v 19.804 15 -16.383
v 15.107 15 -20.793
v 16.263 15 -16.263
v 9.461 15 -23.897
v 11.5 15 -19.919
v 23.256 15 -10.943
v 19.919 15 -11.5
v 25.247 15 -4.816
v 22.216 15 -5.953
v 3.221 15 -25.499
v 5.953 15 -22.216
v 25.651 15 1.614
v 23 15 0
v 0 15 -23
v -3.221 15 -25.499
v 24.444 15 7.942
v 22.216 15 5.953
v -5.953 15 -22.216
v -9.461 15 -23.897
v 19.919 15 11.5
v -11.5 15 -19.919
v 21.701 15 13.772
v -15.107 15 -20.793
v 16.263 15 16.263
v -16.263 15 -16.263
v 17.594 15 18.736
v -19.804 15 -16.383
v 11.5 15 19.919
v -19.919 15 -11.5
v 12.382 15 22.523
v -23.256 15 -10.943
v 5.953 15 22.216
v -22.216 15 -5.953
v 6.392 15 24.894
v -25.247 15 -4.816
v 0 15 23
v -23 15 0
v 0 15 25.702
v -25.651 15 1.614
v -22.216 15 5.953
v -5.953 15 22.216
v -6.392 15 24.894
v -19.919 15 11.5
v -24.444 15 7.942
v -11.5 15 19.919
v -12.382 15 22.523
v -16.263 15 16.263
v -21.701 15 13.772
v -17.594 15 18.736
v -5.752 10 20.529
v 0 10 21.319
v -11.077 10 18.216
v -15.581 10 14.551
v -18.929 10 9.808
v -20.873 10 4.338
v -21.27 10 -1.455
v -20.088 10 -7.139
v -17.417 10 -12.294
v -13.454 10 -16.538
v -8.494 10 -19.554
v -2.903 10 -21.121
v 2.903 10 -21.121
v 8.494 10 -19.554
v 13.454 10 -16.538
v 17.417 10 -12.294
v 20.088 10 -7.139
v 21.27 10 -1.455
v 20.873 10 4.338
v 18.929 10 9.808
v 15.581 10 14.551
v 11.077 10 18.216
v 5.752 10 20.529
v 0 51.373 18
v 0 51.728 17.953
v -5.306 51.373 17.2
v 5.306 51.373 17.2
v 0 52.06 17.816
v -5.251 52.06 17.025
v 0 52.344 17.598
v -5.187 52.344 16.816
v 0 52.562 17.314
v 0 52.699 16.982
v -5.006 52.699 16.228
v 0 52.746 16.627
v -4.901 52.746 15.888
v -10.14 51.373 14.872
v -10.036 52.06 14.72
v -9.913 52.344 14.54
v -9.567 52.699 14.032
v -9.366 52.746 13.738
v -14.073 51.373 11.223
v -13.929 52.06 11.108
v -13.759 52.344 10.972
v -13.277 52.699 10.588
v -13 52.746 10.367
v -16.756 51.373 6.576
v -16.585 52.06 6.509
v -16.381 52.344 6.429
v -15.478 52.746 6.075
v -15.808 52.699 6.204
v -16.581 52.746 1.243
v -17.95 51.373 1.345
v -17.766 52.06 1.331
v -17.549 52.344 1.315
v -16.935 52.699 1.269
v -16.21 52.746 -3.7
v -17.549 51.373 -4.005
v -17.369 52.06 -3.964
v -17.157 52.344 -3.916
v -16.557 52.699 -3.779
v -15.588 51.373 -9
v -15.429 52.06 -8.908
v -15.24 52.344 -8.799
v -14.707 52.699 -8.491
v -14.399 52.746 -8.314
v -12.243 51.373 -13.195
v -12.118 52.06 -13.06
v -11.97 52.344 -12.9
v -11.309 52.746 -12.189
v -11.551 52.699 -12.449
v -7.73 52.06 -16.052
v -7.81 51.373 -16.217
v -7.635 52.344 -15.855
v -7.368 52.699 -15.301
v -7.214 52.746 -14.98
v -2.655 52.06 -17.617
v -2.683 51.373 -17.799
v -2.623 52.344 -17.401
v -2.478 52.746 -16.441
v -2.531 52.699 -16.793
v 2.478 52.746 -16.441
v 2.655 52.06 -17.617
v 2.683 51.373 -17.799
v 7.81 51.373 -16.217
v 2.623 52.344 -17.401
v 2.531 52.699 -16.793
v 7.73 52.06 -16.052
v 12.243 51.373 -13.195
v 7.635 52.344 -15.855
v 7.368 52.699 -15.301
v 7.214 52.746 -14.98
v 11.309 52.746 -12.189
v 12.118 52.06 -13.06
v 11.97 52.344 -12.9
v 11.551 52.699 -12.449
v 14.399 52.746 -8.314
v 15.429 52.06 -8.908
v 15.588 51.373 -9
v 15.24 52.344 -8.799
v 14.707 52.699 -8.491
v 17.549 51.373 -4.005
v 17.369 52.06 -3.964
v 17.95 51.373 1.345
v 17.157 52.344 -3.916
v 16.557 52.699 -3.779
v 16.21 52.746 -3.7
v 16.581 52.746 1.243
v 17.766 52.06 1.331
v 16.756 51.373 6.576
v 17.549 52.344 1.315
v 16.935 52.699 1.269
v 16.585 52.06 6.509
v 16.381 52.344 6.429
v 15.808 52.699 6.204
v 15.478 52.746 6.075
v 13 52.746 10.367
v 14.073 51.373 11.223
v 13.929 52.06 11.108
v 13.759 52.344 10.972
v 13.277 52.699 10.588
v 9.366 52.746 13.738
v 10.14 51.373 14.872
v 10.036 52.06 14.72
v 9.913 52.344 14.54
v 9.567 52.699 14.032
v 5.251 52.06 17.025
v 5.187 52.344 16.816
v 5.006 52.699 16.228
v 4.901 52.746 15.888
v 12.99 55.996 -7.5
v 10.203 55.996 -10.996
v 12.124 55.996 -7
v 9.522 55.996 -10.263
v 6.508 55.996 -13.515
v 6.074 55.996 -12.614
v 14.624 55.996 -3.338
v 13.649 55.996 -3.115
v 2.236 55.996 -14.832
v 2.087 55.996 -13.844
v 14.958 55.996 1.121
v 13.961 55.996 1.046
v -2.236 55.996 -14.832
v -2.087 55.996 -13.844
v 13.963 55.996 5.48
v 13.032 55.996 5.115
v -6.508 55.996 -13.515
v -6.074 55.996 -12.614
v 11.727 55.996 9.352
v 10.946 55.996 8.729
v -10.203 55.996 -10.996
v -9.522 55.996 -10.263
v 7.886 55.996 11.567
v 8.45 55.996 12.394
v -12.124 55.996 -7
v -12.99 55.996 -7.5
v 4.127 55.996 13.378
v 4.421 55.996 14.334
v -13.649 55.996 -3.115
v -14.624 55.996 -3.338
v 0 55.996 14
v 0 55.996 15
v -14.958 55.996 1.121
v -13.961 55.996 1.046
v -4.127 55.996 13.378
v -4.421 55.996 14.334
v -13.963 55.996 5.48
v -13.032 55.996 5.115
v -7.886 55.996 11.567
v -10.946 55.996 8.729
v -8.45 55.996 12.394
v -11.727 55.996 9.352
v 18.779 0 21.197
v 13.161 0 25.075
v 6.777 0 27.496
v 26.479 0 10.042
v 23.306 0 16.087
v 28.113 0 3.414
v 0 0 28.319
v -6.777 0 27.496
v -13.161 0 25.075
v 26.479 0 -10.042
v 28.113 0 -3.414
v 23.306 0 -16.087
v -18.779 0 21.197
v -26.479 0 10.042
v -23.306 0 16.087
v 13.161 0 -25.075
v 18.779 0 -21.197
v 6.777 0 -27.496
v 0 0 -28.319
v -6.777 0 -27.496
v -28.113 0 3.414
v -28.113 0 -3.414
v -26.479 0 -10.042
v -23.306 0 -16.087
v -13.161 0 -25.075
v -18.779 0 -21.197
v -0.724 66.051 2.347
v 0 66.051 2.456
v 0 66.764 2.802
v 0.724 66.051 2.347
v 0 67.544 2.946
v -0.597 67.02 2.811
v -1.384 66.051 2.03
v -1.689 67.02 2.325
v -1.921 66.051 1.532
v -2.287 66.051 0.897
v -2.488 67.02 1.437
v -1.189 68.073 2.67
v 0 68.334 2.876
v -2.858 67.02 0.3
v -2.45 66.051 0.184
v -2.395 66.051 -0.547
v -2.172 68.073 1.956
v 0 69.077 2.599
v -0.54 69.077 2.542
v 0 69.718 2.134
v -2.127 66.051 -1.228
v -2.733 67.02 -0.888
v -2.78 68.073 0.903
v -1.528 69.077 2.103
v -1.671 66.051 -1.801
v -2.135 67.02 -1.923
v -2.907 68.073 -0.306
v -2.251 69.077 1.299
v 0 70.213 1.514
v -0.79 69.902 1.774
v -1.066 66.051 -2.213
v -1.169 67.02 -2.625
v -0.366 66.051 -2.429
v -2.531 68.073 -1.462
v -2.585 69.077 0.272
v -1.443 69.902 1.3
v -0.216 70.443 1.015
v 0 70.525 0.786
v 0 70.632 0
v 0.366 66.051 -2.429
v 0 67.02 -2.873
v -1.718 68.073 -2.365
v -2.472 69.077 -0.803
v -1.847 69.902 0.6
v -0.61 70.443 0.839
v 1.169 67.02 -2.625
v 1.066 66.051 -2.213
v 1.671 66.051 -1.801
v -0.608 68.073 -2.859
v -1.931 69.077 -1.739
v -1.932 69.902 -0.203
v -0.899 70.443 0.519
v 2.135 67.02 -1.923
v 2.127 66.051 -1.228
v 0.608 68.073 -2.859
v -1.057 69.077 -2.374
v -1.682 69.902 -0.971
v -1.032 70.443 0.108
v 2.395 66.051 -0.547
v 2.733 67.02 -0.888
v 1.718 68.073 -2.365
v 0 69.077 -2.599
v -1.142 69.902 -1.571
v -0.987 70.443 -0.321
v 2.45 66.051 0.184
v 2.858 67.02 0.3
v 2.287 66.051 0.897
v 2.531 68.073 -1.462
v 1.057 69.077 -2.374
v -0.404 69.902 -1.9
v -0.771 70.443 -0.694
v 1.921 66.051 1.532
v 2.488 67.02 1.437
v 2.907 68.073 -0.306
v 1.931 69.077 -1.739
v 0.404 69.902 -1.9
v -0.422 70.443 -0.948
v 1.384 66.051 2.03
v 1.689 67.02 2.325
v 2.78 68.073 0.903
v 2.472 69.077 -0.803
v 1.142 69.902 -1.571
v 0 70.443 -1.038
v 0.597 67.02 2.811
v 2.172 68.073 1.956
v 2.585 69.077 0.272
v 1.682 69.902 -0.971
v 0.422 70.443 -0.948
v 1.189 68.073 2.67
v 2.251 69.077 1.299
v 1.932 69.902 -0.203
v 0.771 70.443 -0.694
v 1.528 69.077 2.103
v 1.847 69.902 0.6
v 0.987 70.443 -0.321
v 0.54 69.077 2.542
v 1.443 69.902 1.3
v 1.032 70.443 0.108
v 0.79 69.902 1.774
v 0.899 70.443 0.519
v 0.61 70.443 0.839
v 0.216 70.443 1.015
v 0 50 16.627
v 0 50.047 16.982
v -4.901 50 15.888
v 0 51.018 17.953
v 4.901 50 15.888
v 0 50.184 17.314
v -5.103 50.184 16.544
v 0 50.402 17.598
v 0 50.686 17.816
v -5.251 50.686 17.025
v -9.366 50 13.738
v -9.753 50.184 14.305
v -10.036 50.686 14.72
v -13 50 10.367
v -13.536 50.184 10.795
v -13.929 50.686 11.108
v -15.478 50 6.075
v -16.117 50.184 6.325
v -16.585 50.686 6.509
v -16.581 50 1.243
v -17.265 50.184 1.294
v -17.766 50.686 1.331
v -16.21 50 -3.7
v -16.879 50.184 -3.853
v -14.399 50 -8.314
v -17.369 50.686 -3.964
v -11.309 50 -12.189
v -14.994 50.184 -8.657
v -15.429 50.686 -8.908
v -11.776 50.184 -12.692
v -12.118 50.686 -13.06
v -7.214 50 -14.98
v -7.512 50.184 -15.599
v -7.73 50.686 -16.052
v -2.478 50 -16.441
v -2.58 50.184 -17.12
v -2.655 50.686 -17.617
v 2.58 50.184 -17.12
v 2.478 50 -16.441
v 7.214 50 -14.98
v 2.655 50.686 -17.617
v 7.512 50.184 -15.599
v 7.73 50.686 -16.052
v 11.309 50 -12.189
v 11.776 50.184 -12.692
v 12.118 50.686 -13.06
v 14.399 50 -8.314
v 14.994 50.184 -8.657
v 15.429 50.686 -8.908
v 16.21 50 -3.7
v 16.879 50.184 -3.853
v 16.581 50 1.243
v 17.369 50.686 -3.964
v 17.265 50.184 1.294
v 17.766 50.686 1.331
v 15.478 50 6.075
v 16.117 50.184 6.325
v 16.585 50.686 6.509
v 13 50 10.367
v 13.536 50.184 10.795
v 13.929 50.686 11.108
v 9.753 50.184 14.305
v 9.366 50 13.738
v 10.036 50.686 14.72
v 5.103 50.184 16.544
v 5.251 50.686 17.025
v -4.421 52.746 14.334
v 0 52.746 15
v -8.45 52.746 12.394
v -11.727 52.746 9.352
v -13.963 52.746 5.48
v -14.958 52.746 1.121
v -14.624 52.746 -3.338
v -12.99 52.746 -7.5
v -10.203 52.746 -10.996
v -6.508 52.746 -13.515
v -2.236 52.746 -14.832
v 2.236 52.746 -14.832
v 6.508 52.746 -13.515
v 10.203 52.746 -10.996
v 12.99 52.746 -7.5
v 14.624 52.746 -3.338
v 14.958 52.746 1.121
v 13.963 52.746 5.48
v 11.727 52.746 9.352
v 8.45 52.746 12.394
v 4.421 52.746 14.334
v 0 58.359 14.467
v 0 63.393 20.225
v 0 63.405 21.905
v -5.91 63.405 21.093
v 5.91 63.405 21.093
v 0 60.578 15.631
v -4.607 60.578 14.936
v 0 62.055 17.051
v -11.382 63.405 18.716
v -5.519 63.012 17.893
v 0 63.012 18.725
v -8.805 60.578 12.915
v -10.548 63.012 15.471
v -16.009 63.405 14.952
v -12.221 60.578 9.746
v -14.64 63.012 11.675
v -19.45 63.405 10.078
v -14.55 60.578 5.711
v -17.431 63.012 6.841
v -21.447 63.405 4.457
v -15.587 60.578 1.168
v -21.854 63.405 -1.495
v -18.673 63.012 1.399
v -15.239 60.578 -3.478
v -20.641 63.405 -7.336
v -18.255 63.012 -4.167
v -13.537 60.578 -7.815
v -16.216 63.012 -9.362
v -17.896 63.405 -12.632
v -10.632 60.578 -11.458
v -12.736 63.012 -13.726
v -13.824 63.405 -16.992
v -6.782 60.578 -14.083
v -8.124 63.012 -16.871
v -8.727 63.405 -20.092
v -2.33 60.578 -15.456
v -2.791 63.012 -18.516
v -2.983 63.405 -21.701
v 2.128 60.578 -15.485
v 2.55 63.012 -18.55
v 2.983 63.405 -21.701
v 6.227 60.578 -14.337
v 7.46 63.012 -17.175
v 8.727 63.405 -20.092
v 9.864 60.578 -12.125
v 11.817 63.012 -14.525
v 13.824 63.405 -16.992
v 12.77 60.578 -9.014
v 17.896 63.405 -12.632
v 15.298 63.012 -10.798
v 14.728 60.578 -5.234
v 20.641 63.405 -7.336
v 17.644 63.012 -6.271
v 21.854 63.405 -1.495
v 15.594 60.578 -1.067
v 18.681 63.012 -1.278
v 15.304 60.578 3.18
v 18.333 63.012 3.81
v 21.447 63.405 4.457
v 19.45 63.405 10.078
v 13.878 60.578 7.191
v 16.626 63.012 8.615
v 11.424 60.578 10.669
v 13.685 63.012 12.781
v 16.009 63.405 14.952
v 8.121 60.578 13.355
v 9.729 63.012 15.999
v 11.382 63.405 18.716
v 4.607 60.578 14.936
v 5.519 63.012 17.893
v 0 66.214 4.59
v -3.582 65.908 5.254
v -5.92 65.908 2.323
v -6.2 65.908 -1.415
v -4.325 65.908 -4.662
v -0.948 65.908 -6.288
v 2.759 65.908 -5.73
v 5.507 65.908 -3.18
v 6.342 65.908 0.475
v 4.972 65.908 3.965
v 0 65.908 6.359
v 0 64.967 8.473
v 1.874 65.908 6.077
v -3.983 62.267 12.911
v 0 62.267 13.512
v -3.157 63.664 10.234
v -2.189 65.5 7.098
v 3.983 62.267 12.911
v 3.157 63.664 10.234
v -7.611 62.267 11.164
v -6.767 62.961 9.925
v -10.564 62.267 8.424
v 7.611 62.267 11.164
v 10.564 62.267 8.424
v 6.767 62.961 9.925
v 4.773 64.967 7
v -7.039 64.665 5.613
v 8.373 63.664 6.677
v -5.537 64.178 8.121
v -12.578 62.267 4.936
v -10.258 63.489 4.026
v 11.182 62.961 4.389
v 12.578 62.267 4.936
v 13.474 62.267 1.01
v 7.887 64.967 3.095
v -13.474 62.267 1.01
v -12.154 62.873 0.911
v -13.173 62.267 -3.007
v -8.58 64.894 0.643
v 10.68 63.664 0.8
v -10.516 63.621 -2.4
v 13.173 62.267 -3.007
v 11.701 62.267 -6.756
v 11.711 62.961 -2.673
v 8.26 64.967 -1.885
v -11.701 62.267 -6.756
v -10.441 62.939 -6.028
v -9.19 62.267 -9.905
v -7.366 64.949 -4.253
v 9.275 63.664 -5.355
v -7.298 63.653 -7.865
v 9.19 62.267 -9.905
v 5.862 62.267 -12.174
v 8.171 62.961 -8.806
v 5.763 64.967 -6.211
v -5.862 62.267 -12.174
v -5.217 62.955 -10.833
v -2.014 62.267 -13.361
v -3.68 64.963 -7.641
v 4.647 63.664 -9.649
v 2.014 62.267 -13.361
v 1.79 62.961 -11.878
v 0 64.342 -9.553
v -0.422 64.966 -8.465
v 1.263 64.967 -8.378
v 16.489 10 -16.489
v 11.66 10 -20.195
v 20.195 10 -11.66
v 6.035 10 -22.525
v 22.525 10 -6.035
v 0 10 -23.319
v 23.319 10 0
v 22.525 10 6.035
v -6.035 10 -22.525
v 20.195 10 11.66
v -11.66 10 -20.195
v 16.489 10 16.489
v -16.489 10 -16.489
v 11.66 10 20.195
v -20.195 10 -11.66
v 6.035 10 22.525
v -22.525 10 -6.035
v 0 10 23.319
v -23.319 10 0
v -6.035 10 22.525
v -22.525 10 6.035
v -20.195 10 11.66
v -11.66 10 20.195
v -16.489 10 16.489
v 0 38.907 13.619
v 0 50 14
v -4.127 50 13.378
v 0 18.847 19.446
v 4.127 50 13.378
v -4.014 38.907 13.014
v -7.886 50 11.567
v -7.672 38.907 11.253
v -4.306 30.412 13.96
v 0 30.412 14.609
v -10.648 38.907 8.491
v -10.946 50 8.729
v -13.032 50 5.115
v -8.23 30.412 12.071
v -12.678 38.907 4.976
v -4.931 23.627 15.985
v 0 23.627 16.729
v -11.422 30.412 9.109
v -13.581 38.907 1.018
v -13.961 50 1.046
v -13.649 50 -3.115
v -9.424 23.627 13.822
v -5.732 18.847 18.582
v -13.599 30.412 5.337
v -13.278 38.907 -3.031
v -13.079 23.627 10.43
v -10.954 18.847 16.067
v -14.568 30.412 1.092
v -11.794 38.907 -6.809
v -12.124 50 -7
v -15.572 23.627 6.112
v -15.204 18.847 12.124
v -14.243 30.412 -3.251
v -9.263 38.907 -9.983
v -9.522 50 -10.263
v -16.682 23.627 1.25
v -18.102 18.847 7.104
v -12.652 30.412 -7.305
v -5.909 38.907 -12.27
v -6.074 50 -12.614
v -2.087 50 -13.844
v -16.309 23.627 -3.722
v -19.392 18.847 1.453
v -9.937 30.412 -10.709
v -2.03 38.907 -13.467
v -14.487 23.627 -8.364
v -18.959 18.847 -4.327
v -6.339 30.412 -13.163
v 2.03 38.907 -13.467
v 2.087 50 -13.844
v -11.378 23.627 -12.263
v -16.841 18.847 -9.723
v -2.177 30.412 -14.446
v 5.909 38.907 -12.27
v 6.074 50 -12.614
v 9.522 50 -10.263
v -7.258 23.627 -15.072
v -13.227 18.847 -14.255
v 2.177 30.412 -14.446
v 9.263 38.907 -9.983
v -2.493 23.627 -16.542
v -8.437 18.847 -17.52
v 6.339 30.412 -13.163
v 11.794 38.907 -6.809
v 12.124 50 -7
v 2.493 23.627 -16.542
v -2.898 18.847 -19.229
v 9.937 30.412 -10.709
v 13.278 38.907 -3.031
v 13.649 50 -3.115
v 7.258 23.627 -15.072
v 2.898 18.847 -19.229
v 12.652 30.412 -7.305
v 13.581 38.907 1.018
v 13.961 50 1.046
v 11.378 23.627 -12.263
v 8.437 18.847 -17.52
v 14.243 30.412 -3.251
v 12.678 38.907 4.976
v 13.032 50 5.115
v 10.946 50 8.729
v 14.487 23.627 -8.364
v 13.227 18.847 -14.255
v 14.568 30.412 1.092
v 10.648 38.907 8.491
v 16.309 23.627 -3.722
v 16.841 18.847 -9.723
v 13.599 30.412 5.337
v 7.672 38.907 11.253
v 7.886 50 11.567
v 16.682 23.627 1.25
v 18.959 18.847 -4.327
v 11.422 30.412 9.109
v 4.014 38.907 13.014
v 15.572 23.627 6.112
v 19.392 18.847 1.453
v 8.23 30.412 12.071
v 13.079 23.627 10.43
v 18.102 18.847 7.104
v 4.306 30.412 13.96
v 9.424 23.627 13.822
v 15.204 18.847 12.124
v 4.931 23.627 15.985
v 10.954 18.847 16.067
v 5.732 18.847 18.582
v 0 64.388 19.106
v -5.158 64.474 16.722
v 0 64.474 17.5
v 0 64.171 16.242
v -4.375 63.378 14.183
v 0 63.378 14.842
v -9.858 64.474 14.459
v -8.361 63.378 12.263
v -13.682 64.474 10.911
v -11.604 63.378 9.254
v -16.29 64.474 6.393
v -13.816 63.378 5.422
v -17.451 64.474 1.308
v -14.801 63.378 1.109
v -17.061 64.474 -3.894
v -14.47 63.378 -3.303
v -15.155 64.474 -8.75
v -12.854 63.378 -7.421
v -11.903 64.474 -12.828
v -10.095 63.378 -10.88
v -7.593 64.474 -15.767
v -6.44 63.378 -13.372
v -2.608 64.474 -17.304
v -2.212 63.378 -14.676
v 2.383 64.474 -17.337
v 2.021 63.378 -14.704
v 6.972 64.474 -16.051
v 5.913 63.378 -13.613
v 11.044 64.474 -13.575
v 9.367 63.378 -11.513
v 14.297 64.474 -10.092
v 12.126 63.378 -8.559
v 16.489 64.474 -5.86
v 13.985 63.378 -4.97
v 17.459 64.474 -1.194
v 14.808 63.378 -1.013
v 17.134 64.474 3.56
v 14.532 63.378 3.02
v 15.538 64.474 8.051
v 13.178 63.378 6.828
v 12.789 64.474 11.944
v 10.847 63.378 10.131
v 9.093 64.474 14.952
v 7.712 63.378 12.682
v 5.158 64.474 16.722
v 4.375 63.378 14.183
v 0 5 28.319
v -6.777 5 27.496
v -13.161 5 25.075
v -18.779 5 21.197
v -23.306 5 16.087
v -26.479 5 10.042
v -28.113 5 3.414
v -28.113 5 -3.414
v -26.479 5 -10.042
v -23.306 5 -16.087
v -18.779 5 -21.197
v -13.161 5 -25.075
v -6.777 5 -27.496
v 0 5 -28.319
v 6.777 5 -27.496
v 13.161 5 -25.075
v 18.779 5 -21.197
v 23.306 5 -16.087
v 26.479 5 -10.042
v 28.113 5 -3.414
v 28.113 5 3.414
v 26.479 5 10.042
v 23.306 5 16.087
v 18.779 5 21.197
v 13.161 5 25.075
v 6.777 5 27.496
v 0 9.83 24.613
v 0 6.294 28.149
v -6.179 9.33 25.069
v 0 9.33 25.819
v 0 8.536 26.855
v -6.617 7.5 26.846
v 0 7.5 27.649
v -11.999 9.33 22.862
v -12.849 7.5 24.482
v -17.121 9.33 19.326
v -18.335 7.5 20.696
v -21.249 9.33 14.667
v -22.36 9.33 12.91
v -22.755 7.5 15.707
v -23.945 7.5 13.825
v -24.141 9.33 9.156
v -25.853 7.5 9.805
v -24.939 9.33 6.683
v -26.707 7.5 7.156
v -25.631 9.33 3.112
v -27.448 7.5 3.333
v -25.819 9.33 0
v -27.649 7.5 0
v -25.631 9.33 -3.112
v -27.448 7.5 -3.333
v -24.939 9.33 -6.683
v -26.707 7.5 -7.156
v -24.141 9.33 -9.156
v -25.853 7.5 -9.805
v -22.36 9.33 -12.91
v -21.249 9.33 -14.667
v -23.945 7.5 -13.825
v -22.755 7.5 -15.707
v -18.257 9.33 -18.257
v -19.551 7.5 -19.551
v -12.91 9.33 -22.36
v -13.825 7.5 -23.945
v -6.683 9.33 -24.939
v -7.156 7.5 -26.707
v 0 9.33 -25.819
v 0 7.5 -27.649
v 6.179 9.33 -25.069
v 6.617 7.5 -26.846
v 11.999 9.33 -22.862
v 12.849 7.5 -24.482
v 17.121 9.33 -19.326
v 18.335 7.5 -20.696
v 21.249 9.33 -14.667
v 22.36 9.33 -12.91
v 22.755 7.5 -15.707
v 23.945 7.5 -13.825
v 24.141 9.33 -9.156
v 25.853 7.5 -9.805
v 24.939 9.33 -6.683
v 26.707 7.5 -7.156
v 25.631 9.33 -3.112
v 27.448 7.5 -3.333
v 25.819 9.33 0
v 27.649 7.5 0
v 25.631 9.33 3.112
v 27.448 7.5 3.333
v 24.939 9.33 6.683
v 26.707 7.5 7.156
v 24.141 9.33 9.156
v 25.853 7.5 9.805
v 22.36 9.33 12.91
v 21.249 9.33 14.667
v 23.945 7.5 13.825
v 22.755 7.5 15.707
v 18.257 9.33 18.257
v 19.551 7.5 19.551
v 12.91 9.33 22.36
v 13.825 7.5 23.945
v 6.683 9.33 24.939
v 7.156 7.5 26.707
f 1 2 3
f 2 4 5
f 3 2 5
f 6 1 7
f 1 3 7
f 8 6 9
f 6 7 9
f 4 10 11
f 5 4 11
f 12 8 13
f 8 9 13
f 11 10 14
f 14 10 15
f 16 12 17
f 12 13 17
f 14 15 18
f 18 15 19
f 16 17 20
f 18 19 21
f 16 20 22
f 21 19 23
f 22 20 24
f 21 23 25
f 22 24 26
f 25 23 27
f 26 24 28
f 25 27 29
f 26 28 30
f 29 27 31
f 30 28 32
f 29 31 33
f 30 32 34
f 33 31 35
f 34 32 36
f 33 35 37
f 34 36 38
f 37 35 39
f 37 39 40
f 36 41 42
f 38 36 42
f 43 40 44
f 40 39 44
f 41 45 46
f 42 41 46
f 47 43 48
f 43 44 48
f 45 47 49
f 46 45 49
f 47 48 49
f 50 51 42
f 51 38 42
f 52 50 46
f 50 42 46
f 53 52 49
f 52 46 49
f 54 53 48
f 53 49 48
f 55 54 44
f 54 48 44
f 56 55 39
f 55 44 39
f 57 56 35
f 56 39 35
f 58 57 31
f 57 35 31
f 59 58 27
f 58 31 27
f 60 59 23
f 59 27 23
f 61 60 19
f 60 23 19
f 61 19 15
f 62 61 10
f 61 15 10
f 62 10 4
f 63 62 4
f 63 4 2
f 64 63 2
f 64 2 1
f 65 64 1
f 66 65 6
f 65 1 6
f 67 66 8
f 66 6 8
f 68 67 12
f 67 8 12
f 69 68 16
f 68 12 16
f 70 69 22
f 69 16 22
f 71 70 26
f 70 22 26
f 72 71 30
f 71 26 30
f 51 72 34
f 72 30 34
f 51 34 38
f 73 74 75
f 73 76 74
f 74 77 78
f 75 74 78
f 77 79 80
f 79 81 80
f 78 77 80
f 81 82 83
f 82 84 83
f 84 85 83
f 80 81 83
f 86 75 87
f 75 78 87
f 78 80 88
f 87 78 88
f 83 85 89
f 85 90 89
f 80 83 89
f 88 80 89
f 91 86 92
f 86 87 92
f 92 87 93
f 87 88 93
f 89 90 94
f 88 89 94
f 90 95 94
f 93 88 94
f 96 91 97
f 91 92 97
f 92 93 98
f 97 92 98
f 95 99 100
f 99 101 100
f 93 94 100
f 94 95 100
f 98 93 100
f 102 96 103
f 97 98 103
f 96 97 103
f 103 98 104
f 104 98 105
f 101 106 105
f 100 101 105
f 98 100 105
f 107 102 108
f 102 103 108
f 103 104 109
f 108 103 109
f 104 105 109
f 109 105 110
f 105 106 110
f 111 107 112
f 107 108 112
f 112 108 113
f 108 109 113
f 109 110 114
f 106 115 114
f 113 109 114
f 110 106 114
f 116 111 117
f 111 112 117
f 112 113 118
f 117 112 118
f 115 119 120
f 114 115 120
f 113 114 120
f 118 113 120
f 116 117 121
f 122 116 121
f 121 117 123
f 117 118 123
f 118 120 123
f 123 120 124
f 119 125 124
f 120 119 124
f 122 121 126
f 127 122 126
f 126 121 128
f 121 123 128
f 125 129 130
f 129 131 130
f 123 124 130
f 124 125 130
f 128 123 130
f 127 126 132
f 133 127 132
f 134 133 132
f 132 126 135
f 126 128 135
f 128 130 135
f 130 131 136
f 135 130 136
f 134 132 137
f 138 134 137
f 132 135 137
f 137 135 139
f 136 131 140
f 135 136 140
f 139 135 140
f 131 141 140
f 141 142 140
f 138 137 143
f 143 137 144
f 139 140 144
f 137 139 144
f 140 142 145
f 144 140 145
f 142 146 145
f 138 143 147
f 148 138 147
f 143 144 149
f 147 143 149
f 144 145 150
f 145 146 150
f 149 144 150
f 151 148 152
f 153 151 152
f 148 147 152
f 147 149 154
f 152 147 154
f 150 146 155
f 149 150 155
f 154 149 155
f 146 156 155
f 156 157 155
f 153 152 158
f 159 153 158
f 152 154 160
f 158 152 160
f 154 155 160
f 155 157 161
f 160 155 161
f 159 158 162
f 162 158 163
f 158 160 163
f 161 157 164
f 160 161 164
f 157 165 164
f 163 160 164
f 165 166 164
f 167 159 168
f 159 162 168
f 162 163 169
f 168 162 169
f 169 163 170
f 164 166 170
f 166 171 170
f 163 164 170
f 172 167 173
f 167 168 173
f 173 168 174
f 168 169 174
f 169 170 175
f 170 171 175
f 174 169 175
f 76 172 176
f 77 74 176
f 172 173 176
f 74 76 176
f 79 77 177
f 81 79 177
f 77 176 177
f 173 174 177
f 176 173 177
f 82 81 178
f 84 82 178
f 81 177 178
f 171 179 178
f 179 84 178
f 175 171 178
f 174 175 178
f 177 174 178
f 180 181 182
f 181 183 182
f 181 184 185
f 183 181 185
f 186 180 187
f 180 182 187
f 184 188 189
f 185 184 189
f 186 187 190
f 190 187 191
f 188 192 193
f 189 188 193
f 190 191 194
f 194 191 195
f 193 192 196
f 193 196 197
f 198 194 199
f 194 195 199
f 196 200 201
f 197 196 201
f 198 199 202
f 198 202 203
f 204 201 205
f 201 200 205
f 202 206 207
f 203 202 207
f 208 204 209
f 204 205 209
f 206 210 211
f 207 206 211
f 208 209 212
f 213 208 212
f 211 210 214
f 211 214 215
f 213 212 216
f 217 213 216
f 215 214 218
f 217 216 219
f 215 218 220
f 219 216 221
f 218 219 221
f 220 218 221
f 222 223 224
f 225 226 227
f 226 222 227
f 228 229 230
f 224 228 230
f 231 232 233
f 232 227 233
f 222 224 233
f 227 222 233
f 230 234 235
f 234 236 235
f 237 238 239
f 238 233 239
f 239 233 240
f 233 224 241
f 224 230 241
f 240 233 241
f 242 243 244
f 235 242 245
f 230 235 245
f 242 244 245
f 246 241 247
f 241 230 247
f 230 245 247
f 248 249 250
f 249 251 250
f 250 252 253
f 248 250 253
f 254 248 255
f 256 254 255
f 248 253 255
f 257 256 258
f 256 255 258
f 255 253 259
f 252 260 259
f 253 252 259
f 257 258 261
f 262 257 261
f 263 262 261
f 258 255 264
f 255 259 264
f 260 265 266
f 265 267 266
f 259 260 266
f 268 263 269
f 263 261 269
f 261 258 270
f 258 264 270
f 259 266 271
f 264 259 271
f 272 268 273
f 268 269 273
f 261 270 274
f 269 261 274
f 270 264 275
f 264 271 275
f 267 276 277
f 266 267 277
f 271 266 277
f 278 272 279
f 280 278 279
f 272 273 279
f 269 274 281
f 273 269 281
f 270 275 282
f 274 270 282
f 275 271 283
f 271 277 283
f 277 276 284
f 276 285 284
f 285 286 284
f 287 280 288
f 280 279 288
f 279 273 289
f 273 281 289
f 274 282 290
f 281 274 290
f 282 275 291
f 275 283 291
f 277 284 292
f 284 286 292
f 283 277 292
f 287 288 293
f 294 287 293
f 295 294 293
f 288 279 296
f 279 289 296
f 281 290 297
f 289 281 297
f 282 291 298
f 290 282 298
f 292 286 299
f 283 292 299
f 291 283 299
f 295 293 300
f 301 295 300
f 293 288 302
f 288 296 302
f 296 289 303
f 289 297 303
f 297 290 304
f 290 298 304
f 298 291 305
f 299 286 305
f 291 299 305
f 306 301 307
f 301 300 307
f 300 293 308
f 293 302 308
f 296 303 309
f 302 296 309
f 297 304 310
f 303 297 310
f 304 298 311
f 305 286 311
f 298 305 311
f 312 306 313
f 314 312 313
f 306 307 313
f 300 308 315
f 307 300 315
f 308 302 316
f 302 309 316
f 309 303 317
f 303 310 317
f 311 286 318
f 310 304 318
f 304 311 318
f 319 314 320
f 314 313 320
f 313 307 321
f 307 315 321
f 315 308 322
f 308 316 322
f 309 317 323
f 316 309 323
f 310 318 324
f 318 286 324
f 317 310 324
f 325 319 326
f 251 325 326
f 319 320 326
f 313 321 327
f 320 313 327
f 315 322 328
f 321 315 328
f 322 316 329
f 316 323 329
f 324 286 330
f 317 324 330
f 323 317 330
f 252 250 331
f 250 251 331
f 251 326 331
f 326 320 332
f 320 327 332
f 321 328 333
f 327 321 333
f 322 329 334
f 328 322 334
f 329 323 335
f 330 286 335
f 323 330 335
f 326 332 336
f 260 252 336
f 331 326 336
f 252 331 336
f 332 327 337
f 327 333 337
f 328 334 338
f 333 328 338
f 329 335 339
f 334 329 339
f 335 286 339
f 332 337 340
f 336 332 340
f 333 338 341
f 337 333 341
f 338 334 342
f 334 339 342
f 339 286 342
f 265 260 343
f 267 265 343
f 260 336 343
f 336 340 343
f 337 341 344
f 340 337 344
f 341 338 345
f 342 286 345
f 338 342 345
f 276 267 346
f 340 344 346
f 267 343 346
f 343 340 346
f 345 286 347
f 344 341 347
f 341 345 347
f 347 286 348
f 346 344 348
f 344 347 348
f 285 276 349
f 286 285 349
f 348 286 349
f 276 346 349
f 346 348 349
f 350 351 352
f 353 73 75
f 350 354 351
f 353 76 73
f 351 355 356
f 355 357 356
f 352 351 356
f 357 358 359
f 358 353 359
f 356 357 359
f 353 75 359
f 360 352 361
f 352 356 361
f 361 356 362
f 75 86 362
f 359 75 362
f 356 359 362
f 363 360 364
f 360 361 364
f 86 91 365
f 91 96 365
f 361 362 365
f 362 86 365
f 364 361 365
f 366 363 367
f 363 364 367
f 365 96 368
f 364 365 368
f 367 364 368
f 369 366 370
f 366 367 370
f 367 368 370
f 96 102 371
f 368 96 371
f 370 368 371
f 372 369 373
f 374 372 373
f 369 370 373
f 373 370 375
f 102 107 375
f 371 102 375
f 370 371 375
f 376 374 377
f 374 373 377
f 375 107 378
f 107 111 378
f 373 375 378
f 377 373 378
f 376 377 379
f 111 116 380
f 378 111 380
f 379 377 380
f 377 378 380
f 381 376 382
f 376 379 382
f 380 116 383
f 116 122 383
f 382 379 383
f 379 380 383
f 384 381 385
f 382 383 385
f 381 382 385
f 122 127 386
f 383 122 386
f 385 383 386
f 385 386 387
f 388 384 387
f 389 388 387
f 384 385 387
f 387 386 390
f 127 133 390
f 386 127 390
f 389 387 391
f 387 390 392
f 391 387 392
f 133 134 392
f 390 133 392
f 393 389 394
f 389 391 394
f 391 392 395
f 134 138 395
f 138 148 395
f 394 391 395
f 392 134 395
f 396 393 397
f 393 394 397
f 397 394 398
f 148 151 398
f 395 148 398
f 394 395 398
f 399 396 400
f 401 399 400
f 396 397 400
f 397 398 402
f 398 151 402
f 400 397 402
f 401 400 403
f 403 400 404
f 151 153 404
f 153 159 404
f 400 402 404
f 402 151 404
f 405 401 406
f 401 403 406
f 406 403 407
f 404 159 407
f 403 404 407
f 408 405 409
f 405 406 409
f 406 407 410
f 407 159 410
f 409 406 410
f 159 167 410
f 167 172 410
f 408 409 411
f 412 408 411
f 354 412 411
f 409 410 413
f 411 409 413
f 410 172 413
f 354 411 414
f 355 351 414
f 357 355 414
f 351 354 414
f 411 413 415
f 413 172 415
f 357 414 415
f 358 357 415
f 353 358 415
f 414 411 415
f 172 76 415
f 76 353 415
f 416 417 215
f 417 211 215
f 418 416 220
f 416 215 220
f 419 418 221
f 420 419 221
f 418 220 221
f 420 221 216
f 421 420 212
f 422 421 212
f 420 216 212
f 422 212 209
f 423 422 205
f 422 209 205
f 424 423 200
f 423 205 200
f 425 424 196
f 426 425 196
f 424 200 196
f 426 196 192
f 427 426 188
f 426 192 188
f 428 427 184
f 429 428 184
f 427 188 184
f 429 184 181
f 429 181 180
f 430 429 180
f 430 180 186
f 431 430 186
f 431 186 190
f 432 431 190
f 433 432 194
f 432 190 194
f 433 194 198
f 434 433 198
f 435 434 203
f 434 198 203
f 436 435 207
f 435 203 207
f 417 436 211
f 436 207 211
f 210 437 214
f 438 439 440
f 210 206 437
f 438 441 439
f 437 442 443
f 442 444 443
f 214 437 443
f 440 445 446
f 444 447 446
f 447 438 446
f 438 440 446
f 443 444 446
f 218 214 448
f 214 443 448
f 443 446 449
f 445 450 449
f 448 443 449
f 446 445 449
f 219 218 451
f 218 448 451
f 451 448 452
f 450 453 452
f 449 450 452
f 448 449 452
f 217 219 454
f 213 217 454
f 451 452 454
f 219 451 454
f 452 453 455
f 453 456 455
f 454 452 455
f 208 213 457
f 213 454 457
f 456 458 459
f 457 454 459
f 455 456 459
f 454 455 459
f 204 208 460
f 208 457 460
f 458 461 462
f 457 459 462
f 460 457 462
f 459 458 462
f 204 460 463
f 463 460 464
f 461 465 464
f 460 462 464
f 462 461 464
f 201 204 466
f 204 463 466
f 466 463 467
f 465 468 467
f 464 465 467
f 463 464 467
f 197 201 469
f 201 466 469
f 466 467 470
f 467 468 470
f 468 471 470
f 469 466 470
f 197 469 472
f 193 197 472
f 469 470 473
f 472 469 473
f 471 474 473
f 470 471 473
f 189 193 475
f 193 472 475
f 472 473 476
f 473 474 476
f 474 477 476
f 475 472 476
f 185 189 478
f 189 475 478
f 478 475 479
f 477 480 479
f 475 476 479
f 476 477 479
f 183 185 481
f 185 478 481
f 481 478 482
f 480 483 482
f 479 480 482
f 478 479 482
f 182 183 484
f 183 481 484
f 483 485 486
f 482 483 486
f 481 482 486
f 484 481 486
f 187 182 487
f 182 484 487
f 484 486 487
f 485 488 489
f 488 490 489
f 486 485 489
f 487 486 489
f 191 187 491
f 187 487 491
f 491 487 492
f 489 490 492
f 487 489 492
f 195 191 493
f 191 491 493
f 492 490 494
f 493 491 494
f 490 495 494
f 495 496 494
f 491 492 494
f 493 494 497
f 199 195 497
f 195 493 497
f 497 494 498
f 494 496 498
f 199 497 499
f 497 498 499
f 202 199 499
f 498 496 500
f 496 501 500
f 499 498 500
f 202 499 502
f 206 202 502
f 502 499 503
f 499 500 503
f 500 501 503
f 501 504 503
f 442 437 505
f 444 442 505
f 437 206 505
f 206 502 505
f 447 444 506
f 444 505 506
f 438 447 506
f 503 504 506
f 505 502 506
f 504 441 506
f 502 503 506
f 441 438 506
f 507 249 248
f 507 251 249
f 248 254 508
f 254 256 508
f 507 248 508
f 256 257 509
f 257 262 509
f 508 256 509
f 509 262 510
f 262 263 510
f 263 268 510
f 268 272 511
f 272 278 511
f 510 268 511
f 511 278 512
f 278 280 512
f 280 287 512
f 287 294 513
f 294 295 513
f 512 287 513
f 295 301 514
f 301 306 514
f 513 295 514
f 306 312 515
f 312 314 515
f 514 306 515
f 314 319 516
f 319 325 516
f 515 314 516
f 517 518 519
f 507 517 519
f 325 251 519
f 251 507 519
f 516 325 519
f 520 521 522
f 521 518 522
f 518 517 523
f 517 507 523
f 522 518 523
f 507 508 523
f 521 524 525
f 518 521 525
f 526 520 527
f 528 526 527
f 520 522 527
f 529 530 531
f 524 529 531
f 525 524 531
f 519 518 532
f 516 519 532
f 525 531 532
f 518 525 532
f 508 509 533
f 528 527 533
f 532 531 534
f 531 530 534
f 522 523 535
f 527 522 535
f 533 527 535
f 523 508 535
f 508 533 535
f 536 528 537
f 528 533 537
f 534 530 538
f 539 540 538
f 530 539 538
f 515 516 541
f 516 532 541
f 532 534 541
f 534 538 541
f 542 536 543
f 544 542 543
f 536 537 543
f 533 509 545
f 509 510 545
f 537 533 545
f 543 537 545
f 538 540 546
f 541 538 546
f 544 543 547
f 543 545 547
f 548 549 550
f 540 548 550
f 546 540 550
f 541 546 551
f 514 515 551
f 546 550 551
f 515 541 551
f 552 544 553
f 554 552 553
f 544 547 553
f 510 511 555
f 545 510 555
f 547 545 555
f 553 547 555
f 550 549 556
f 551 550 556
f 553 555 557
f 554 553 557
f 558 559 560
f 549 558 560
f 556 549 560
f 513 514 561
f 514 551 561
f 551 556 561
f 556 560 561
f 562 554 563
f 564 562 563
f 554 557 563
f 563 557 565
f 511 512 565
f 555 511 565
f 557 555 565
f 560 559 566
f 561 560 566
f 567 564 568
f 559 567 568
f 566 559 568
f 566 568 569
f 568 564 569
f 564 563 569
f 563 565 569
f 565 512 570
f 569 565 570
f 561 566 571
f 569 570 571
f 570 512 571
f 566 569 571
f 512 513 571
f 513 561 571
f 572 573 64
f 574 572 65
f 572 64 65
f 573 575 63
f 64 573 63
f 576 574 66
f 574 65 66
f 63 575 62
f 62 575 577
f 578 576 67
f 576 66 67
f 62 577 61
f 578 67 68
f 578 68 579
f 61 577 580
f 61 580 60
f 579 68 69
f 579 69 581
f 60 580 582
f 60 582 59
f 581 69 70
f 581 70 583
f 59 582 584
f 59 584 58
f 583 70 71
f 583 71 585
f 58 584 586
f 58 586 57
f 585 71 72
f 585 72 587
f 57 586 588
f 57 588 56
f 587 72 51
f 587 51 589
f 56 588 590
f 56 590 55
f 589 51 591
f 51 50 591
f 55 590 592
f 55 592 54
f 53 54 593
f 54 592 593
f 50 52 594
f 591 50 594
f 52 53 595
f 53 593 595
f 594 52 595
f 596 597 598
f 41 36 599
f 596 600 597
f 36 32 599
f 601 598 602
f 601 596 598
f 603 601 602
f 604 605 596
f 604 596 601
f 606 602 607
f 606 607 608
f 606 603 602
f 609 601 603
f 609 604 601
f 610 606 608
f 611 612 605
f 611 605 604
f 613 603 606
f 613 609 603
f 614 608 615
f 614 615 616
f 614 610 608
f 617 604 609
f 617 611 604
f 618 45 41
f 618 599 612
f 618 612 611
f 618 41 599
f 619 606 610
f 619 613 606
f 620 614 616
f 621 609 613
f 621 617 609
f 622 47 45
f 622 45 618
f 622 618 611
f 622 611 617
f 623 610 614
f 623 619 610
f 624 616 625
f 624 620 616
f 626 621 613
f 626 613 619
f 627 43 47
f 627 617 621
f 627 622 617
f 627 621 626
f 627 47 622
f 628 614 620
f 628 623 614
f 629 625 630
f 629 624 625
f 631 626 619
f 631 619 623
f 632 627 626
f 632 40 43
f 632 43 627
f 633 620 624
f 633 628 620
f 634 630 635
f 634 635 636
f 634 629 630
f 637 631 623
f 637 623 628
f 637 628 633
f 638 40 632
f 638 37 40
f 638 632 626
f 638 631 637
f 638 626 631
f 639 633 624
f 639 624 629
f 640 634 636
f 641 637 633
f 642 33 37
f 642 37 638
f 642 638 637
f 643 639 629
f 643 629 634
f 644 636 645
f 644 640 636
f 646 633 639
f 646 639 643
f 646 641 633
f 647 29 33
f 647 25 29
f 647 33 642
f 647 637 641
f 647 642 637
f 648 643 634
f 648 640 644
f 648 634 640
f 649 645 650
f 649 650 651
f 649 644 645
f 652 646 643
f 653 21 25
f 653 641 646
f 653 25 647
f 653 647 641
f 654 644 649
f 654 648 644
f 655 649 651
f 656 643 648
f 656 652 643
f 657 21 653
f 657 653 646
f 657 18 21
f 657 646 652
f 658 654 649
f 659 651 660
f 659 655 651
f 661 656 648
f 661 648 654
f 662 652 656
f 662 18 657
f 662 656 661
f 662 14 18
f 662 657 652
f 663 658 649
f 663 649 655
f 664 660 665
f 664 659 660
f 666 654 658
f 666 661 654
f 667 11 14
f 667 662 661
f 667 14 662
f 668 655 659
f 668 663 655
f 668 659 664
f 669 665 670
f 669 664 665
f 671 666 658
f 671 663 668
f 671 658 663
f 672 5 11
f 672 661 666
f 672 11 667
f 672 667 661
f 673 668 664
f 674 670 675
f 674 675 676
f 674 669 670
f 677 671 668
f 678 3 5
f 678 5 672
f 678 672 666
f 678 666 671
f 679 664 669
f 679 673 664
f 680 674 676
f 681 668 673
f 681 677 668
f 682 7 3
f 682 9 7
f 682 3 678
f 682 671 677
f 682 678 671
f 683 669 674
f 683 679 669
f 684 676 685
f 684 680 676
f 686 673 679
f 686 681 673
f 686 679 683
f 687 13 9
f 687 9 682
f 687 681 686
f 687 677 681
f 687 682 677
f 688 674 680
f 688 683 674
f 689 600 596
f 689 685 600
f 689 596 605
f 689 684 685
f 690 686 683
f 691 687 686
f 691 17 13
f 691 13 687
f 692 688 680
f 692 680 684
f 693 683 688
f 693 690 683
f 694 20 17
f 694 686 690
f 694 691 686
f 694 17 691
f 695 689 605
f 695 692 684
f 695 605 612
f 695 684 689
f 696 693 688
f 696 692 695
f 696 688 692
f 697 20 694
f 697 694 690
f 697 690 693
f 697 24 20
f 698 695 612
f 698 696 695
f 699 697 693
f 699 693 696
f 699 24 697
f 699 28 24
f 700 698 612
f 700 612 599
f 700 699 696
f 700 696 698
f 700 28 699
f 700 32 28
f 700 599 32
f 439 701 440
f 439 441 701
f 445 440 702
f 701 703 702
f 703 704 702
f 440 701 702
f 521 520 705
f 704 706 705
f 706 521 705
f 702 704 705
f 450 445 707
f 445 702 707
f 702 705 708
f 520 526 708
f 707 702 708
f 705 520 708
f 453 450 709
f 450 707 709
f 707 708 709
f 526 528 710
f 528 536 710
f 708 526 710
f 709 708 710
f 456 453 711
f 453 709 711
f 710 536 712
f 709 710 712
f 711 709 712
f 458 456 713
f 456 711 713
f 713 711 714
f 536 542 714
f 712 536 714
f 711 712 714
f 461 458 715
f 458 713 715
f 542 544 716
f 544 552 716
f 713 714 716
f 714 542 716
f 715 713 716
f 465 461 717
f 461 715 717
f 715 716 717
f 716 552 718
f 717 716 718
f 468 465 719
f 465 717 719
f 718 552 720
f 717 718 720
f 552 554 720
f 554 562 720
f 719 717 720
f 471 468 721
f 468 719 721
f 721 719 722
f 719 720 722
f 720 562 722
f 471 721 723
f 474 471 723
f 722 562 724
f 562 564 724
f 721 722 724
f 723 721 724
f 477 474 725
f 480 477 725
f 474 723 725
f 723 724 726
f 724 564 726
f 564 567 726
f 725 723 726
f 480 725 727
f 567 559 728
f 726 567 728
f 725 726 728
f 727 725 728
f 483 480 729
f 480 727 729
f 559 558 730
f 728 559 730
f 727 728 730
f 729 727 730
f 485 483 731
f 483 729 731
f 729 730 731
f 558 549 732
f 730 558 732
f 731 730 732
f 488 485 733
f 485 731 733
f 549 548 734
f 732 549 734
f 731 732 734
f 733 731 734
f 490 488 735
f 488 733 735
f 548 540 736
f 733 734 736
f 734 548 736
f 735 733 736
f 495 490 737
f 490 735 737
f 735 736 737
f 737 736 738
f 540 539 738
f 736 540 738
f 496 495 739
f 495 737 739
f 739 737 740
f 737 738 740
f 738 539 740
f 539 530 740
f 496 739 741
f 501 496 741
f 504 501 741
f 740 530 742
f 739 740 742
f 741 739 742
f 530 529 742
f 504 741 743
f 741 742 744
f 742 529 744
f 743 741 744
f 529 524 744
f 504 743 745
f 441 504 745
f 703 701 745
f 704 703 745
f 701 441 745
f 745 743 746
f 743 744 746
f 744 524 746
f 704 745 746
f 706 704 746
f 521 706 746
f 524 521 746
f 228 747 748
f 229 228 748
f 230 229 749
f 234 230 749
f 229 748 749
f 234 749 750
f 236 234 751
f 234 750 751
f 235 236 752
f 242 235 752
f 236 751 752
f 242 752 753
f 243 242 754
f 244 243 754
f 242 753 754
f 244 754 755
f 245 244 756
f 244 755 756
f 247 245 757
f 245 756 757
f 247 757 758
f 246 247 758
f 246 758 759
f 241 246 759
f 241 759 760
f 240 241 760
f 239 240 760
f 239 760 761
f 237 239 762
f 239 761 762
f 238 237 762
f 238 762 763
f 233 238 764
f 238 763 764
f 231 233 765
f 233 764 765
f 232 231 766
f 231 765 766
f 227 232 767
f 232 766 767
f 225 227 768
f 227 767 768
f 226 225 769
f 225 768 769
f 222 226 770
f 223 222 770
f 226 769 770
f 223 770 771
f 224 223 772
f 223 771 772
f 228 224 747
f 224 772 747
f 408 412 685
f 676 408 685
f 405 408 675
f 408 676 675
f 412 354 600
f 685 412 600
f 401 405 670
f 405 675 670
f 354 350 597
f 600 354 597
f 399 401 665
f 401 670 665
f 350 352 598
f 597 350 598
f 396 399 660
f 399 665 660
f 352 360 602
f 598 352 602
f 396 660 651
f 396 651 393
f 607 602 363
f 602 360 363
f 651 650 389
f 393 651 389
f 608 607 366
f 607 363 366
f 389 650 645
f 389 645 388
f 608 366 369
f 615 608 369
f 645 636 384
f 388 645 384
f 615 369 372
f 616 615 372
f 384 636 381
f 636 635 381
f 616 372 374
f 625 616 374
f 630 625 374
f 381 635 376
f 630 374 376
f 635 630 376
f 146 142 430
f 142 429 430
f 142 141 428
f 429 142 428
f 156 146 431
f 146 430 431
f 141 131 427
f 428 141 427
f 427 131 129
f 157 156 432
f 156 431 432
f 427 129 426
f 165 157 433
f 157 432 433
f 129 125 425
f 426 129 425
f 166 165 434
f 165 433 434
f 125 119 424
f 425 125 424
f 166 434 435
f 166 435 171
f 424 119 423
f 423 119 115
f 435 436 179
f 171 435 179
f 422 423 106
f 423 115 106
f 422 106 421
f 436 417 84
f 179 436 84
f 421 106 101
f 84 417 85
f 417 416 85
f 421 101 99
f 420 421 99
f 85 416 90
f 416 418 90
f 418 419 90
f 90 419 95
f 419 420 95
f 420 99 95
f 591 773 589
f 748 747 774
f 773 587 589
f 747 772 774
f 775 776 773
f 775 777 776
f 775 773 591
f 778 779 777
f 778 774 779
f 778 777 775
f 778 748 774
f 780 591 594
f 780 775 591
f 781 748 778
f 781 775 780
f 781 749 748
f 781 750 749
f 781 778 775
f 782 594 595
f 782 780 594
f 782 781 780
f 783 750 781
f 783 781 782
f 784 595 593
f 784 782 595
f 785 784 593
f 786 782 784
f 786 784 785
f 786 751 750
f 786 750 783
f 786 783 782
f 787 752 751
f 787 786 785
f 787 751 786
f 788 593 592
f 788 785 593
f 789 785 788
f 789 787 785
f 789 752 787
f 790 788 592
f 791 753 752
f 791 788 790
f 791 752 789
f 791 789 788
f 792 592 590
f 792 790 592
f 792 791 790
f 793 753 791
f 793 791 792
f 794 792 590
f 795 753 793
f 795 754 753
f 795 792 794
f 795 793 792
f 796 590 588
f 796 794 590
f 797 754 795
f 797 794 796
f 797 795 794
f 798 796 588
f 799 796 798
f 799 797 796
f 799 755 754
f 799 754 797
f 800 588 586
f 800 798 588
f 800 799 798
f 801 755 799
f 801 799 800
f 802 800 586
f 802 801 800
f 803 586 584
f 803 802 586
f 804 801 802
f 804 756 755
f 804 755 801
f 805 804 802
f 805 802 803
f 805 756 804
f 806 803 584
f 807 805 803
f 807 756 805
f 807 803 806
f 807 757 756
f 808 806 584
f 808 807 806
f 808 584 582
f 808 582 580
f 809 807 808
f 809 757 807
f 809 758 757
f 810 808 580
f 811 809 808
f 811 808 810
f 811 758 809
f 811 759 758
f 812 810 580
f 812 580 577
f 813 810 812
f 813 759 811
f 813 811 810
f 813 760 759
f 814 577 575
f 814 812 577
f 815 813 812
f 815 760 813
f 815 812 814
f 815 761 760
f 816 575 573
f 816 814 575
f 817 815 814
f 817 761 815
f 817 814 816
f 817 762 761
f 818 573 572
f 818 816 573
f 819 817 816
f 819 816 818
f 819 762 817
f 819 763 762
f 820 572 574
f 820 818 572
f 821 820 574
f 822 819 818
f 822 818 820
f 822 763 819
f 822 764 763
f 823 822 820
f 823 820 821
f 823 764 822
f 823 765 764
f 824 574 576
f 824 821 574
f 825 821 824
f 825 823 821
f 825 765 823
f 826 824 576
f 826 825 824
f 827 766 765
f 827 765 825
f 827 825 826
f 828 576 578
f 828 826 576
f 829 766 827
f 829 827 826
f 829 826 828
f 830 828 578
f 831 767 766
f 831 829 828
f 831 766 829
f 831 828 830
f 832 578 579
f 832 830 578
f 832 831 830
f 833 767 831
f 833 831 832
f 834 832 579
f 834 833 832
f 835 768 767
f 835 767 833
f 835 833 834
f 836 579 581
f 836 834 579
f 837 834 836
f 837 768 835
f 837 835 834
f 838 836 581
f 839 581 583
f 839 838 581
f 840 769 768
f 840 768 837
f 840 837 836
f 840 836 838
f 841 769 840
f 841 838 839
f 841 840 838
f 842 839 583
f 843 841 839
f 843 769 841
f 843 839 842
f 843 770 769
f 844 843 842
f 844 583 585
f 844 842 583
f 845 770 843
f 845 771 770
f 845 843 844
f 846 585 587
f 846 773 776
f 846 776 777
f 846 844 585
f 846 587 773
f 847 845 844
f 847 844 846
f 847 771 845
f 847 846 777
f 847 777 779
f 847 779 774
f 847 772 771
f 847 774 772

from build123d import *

# Parameters (mm, degrees)
FILLET_1_R = 1.373006
FILLET_7_R = 5


with BuildPart() as part:
    # Эскиз1 → Повернуть11 (revolve)
    with BuildSketch(Plane.XY, mode=Mode.PRIVATE) as revolve_11_sk:
        with BuildLine():
            Line((-28.319201636, 10), (-21.319202, 10))
            Line((-21.319202, 10), (-25.70187, 15))
            Line((-25.70187, 15), (-23, 15))
            add(Edge.make_bspline(
                [(-14, 50), (-11.549443609, 24.743870175), (-23, 15)],
                knots=[0, 0, 0, 0.889445697, 0.889445697, 0.889445697], degree=2))
            Line((-14, 50), (-18, 50))
            Line((-18, 50), (-18, 52.746011712))
            Line((-18, 52.746011712), (-15, 52.746011712))
            Line((-15, 52.746011712), (-15, 55.996011712))
            Line((-15, 55.996011712), (-14, 55.996011712))
            add(Edge.make_bspline(
                [(-14, 55.996011712), (-14.161861727, 59.65371566), (-17.070590258, 63.93206534), (-21.905488907, 63.404692418)],
                knots=[0, 0, 0, 0, 1, 1, 1, 1], degree=3))
            add(Edge.make_bspline(
                [(-21.905488907, 63.404692418), (-17.493420158, 65.534477533), (-15.673935308, 64.221639363), (-13.511618863, 62.267458412)],
                knots=[0, 0, 0, 0, 1, 1, 1, 1], degree=3))
            add(Edge.make_bspline(
                [(-13.511618863, 62.267458412), (-8.664813479, 64.29884008), (-7.212551469, 66.920528446), (-2.456427554, 66.051109587)],
                knots=[0, 0, 0, 0, 0.620902489, 0.620902489, 0.620902489, 0.620902489], degree=3))
            ThreePointArc((-2.456427554, 66.051109587), (-2.598911214, 69.07652309), (0, 70.631865164))
            Line((0, 70.631865164), (0, 0))
            Line((0, 0), (-28.319201636, 0))
            Line((-28.319201636, 0), (-28.319201636, 10))
        make_face()
    revolve(revolve_11_sk.sketch.rotate(Axis((0, 70.631865164, 0), (0, -1, 0)), 270), axis=Axis((0, 70.631865164, 0), (0, -1, 0)))

    # Скругление1
    fillet_1_edges = [part.edges().sort_by_distance(p)[0] for p in [
        (0, 50, -18),
        (0, 52.746011712, -18),
    ]]
    fillet(fillet_1_edges, radius=FILLET_1_R - 0.0001)  # a hair under: the kernel refuses the full size

    # Скругление7
    fillet_7_edges = [part.edges().sort_by_distance(p)[0] for p in [
        (0, 10, -28.319201636),
    ]]
    fillet(fillet_7_edges, radius=FILLET_7_R)


solid = part.part
